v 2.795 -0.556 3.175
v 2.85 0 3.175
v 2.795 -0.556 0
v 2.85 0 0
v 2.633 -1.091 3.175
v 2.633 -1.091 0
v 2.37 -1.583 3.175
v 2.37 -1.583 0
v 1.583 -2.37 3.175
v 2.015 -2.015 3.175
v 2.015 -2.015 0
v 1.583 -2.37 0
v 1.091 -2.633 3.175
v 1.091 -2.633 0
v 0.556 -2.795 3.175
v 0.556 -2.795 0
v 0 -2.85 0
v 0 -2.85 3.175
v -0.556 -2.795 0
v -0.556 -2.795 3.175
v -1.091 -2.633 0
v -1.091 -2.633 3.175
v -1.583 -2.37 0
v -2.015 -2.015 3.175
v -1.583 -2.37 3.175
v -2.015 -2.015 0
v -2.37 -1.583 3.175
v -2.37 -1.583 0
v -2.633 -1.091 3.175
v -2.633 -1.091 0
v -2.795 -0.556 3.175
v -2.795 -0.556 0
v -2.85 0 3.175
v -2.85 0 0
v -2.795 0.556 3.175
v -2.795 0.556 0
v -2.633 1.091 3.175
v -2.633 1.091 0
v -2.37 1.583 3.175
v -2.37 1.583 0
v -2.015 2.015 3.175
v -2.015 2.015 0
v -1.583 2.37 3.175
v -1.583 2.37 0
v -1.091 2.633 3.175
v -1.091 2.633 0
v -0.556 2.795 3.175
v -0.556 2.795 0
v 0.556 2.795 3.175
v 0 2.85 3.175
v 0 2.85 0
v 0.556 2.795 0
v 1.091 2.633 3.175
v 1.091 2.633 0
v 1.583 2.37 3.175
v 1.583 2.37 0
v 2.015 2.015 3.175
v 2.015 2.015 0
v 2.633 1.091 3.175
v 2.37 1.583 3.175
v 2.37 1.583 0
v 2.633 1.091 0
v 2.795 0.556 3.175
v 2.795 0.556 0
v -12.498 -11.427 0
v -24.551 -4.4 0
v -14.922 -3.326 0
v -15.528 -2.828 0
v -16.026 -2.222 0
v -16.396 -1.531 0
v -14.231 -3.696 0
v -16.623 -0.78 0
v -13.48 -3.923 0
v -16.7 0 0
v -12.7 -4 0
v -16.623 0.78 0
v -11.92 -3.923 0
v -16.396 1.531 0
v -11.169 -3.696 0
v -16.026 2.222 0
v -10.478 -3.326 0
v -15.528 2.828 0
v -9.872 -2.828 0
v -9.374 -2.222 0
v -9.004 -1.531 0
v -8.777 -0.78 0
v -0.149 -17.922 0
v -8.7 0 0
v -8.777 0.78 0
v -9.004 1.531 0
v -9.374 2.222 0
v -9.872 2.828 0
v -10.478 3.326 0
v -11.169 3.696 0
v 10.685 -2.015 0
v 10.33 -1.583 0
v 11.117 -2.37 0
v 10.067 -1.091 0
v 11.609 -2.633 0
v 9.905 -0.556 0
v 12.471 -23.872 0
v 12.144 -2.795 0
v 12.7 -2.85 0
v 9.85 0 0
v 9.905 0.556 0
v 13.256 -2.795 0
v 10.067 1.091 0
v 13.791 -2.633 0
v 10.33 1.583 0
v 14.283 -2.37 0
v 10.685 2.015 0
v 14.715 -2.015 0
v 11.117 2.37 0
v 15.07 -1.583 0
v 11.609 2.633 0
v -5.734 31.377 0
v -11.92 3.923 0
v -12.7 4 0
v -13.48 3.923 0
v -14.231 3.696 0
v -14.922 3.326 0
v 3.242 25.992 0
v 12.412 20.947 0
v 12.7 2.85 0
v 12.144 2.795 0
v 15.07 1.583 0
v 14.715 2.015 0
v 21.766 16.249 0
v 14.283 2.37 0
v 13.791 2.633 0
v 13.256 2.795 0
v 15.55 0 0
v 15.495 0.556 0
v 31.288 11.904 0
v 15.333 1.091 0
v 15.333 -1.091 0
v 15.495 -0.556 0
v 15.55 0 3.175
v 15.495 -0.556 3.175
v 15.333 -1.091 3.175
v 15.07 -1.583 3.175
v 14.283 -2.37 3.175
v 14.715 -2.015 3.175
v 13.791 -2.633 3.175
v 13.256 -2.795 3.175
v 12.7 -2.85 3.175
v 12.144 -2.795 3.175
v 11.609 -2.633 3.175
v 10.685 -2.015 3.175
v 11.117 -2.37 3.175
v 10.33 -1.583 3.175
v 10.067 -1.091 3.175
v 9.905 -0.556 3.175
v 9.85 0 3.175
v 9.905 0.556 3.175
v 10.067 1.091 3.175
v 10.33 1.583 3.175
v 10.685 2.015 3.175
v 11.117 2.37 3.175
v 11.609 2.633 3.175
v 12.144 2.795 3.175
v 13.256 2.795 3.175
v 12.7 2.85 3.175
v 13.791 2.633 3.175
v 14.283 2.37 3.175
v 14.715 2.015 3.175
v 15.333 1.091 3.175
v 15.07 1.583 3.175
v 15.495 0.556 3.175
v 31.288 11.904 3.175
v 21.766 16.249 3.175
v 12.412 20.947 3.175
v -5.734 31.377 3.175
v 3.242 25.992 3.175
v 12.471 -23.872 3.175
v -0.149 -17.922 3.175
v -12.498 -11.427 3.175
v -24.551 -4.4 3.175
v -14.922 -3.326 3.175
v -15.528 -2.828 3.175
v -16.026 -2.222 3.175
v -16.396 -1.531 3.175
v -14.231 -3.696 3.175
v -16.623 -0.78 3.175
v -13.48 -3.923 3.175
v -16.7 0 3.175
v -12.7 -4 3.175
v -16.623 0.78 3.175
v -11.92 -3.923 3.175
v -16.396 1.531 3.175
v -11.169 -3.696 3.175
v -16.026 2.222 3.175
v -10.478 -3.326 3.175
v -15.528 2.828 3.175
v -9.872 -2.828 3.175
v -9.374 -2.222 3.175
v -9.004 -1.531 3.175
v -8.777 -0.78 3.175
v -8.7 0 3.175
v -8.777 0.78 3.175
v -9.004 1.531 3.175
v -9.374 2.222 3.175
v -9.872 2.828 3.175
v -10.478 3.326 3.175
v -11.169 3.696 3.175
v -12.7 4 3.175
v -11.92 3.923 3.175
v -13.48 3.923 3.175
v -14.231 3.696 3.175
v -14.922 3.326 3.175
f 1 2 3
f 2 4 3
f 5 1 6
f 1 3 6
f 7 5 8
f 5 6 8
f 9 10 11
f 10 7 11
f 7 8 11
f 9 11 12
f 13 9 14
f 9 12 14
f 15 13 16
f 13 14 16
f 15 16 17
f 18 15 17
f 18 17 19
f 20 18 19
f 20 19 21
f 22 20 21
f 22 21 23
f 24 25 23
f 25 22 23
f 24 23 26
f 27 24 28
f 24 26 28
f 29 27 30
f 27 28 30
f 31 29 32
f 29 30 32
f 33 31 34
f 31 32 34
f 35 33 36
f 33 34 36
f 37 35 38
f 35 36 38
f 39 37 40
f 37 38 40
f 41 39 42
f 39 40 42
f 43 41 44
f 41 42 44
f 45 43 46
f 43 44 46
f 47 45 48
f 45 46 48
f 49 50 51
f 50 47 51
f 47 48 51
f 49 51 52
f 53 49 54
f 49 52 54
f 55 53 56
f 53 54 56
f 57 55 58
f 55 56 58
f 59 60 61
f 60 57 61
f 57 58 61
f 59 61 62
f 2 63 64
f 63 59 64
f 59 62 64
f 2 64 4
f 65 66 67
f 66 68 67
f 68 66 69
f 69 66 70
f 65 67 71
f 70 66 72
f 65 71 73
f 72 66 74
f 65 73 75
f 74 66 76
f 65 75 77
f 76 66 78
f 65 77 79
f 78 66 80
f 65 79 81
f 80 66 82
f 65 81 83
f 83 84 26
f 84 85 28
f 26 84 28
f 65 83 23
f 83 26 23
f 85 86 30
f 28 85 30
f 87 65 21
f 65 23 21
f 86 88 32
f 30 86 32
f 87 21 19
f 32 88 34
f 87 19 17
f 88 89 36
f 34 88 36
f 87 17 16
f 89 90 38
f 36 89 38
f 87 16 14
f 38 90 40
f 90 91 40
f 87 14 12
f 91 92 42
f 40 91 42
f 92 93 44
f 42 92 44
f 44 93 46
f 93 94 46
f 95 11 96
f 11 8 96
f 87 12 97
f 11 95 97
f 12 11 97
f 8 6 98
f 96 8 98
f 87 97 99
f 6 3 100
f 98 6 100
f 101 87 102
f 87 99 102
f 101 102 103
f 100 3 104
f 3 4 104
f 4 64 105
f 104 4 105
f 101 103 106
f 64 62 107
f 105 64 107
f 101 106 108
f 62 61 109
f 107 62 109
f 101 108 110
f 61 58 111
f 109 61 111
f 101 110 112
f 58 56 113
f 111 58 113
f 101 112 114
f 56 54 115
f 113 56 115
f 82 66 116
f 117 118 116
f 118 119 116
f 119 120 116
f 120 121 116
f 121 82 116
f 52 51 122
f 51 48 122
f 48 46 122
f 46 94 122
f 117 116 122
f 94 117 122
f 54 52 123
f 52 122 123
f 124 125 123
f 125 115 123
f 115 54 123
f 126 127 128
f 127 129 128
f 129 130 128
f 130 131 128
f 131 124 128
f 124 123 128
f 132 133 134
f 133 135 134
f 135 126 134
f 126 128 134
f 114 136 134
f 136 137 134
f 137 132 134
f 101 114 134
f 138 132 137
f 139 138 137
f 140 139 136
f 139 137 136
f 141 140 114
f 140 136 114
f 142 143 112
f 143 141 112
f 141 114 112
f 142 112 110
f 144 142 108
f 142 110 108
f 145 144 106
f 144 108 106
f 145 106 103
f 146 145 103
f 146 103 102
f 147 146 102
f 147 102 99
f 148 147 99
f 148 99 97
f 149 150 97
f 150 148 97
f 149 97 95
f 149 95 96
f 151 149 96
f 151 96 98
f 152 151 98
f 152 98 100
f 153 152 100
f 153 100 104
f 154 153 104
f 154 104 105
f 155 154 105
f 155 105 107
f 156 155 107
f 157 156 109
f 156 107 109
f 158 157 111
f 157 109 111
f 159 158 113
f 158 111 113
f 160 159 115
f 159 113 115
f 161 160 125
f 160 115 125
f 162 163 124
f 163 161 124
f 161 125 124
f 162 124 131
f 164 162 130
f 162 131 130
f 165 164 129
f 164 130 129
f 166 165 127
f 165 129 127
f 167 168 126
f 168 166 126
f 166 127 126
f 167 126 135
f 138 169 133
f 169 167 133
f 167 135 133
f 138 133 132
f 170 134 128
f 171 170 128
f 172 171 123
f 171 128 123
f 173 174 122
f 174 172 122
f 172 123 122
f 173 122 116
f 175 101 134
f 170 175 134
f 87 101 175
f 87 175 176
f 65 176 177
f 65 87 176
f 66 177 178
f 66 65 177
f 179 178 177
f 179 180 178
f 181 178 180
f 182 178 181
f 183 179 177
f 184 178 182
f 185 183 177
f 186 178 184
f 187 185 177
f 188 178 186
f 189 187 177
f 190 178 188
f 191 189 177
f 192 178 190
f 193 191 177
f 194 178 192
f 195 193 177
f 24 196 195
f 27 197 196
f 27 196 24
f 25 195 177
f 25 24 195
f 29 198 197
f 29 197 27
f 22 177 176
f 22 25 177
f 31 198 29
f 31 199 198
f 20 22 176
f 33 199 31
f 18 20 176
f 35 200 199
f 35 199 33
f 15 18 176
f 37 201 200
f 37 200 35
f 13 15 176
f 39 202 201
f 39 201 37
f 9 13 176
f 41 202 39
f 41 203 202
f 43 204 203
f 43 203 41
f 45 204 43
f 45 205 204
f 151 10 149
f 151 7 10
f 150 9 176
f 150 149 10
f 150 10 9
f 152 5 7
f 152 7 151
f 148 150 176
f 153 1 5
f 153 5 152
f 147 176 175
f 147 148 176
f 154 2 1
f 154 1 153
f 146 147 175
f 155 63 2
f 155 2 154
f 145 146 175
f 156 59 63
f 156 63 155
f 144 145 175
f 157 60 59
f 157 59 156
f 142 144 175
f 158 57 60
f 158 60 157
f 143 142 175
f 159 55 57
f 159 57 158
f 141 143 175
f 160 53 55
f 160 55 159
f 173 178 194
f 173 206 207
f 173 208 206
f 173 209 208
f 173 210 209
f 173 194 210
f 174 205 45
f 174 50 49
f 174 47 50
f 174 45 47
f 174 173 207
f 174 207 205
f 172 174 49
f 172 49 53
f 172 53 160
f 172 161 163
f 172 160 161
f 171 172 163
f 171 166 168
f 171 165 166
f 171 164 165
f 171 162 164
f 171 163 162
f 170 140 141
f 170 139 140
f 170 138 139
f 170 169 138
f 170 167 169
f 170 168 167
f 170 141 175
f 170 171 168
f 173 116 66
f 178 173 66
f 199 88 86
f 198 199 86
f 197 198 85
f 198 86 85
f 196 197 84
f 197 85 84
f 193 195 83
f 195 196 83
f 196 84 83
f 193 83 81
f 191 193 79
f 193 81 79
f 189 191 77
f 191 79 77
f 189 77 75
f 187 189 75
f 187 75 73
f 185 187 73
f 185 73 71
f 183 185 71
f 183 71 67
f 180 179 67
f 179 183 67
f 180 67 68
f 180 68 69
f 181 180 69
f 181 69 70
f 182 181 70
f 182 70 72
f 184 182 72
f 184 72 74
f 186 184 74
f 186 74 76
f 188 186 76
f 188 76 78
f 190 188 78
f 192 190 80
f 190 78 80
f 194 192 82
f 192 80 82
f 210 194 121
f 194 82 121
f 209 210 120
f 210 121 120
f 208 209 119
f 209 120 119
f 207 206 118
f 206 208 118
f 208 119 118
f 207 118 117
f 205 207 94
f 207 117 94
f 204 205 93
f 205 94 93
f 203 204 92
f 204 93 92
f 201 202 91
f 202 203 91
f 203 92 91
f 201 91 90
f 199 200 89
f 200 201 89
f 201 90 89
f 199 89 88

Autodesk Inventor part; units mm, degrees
ref_plane "YZ Plane" through (0, 0, 0) normal (1, 0, 0) x (0, 1, 0)
ref_plane "XZ Plane" through (0, 0, 0) normal (0, 1, 0) x (-1, 0, 0)
ref_plane "XY Plane" through (0, 0, 0) normal (0, 0, 1) x (1, 0, 0)
sketch "Sketch1" plane through (0, 0, 0) normal (0, 0, 1) x (1, 0, 0)
  arc A0 (-24.5511, -4.3997) -> (12.4708, -23.8722) centre (142.4756, 268.2278) ccw
  line L0 (12.4708, -23.8722) -> (31.2882, 11.9043)
  arc A1 (-5.7336, 31.3768) -> (31.2882, 11.9043) centre (142.4756, 268.2278) ccw
  line L1 (-5.7336, 31.3768) -> (-24.5511, -4.3997)
  circle A2 centre (-12.7, 0) radius 4
  circle A3 centre (12.7, 0) radius 2.85
  circle A4 centre (0, 0) radius 2.85
  line L2 (-12.7, 0) -> (12.7, 0) construction
  dimension "d0" = 279.4
  dimension "d1" = 319.7243
  dimension "d2" = 25.4
  dimension "d3" = 40.4234
  dimension "d4" = 40.4234
  dimension "d8" = 31.3768
  dimension "d9" = 4.3997
  dimension "d10" = 18.5882
  dimension "d14" = 5.7
  dimension "d15" = 8
extrude "Extrusion1" add sketch "Sketch1" along normal blind 3.175
properties part number "V5 Shooter Conveyor Spacer 1" material "Aluminum-6061"
